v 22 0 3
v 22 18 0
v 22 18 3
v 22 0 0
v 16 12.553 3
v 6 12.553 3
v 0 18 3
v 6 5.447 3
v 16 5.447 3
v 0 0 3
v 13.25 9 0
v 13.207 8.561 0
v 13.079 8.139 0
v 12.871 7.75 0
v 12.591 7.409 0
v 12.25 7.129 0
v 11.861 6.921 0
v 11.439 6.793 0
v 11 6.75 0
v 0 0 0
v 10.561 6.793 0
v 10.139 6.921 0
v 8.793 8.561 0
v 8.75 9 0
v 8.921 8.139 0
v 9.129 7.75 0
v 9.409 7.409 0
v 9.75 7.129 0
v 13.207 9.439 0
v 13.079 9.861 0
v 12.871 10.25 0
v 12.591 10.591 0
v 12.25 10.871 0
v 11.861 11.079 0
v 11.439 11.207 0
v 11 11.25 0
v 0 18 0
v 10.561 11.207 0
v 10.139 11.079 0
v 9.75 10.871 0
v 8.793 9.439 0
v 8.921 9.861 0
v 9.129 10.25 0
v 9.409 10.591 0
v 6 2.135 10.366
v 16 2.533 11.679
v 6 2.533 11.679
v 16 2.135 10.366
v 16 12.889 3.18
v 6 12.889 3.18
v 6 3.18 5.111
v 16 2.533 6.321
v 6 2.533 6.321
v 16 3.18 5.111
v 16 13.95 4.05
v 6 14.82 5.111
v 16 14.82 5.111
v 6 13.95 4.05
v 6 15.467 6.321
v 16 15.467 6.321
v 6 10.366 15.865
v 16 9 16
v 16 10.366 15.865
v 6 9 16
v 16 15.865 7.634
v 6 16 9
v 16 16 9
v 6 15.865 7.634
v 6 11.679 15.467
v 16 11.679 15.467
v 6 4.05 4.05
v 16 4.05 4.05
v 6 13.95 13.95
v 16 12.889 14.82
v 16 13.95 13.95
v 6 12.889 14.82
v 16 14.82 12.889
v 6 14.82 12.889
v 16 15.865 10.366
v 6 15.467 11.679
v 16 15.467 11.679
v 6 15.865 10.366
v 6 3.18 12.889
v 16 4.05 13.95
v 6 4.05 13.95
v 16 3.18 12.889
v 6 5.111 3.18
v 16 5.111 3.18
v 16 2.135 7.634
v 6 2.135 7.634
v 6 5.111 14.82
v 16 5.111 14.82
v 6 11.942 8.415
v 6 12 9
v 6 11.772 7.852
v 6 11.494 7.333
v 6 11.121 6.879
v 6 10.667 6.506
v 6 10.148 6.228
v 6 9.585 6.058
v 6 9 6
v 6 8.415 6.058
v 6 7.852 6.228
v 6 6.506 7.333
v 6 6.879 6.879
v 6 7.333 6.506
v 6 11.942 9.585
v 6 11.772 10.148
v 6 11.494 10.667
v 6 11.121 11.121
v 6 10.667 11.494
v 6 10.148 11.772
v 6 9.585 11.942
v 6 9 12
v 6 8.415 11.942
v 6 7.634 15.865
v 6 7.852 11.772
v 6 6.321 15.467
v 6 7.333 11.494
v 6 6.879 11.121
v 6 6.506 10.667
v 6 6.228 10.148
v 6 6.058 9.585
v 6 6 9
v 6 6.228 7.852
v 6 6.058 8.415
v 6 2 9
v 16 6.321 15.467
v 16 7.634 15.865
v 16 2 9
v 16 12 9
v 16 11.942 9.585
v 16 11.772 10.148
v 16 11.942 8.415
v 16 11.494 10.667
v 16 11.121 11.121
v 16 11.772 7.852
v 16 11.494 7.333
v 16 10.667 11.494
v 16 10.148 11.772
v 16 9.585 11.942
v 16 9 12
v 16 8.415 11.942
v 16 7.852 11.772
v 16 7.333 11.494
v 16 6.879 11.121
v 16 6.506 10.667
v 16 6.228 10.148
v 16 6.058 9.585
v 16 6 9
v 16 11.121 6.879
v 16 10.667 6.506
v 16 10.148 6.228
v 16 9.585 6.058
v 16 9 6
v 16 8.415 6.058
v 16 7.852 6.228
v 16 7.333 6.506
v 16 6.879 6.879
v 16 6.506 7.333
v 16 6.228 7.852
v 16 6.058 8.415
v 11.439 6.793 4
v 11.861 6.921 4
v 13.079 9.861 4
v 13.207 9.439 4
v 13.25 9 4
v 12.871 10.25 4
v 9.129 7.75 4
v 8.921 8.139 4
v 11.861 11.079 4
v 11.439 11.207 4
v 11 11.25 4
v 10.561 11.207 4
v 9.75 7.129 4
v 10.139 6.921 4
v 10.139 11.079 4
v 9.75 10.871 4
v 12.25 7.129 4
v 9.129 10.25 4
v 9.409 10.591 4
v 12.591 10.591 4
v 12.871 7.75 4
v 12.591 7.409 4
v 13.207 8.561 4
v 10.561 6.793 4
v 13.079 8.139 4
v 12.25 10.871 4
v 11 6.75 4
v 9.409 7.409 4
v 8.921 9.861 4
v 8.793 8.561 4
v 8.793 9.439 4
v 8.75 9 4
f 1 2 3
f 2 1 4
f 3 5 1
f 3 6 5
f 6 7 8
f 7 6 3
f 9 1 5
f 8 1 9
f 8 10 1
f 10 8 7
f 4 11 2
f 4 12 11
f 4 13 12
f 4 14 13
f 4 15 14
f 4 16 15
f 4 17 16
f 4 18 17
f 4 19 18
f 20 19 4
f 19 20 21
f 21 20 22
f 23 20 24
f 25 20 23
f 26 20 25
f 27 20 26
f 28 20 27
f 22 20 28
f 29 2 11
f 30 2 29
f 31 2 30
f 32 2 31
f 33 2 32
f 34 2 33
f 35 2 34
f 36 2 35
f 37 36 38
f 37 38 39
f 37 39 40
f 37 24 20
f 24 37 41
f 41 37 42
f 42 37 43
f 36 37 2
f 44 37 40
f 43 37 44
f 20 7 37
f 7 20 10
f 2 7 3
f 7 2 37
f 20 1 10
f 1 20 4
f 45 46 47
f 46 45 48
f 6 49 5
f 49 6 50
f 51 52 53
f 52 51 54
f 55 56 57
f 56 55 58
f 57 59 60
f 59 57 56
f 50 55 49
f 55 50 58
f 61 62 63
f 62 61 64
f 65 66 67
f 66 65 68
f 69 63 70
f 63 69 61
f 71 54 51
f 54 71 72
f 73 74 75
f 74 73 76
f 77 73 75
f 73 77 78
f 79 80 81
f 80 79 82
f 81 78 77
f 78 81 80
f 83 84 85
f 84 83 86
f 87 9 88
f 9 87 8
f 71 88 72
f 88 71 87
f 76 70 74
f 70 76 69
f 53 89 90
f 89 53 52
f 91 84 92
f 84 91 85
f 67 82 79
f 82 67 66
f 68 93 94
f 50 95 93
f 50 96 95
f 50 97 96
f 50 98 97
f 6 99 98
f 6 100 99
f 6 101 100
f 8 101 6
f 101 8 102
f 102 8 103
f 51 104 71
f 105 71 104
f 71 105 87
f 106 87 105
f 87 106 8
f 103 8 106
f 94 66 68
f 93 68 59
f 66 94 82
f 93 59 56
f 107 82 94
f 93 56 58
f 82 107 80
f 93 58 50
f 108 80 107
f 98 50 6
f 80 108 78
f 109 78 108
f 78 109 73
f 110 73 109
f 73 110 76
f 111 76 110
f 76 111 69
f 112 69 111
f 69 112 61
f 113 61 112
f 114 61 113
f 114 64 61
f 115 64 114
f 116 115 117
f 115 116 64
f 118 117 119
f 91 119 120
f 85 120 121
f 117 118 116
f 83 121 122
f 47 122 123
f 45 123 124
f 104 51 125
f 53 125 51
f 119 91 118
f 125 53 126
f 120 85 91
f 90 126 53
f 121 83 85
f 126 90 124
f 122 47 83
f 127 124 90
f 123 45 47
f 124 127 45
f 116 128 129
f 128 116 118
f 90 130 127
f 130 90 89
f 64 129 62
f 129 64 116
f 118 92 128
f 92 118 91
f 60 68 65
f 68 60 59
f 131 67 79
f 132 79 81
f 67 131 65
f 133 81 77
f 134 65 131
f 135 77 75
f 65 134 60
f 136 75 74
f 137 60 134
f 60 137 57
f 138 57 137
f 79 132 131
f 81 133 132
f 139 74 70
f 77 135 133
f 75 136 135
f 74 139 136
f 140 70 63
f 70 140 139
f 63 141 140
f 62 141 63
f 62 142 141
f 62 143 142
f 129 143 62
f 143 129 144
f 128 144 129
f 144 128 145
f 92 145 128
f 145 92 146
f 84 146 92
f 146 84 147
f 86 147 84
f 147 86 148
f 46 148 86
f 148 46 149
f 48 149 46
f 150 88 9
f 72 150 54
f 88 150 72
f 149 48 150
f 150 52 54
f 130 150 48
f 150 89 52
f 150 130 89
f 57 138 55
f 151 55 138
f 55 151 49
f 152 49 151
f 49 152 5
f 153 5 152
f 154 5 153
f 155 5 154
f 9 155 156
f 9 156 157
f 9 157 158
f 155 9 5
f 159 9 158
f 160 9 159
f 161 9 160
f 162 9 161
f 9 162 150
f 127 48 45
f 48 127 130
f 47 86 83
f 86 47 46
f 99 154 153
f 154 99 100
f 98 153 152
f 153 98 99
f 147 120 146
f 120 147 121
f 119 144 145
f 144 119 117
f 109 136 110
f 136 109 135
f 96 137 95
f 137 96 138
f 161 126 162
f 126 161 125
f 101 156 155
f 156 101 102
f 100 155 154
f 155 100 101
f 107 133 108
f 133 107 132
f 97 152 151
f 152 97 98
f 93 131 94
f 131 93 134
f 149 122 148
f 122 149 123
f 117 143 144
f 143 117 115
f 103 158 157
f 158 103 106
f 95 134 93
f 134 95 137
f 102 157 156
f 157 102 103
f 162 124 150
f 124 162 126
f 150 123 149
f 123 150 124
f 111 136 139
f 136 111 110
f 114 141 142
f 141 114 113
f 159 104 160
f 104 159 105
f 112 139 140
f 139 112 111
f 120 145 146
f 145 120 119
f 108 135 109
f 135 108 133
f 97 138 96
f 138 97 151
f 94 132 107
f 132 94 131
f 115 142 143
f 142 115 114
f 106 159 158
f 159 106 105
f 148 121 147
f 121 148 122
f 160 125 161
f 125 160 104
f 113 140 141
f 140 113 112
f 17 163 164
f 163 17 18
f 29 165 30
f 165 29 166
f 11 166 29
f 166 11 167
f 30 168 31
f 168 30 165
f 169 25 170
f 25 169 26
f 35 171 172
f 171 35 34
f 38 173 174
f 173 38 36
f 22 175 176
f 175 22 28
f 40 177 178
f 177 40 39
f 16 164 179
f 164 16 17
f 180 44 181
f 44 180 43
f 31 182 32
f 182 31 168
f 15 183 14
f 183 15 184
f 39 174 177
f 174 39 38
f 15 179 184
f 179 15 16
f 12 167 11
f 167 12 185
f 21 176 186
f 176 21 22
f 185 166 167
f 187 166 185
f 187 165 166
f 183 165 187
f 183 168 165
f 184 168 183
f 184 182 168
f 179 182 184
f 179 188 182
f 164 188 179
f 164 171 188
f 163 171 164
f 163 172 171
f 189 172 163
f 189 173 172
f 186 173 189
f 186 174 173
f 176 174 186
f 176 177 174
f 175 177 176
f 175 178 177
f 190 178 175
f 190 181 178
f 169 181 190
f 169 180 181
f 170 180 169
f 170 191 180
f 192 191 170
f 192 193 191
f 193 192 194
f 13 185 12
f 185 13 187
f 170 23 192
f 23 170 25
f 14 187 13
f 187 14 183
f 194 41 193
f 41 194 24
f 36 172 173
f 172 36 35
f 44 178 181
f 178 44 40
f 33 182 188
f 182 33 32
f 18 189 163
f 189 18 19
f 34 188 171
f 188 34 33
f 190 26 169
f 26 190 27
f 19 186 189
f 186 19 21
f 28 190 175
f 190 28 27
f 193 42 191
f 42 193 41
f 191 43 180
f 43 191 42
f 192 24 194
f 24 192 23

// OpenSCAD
$fn = 32;

// ----------------------------------------------------------------------
// Cable clip: cable 6 mm, clamp 14 mm, base 22 mm
// ----------------------------------------------------------------------

// --- parameters (mm) ---
base_w = 22;              // base length, X
base_d = 18;              // base width, Y
base_t = 3;               // base thickness
clamp_d = 14;             // clamp outside diameter
wall_t = 4;               // clamp wall
cable_d = 6;              // cable opening
ring_w = 10;              // clamp width along the cable
screw_d = 4.5;            // screw clearance
sink = 1;                 // overlap of the clamp into the base

module base() {
  cube([base_w, base_d, base_t]);
}

module clamp() {
  translate([base_w / 2, base_d / 2, base_t + clamp_d / 2 - sink]) rotate([0, 90, 0])
    cylinder(h = ring_w, d = clamp_d, center = true);
}

difference() {
  union() {
    base();
    clamp();
  }
  translate([base_w / 2, base_d / 2, base_t + clamp_d / 2 - sink]) rotate([0, 90, 0]) translate([0, 0, -ring_w / 2 - 1]) cylinder(h = ring_w + 2, d = cable_d);
  translate([11, base_d / 2, -1]) cylinder(h = base_t + 2, d = screw_d);
}
